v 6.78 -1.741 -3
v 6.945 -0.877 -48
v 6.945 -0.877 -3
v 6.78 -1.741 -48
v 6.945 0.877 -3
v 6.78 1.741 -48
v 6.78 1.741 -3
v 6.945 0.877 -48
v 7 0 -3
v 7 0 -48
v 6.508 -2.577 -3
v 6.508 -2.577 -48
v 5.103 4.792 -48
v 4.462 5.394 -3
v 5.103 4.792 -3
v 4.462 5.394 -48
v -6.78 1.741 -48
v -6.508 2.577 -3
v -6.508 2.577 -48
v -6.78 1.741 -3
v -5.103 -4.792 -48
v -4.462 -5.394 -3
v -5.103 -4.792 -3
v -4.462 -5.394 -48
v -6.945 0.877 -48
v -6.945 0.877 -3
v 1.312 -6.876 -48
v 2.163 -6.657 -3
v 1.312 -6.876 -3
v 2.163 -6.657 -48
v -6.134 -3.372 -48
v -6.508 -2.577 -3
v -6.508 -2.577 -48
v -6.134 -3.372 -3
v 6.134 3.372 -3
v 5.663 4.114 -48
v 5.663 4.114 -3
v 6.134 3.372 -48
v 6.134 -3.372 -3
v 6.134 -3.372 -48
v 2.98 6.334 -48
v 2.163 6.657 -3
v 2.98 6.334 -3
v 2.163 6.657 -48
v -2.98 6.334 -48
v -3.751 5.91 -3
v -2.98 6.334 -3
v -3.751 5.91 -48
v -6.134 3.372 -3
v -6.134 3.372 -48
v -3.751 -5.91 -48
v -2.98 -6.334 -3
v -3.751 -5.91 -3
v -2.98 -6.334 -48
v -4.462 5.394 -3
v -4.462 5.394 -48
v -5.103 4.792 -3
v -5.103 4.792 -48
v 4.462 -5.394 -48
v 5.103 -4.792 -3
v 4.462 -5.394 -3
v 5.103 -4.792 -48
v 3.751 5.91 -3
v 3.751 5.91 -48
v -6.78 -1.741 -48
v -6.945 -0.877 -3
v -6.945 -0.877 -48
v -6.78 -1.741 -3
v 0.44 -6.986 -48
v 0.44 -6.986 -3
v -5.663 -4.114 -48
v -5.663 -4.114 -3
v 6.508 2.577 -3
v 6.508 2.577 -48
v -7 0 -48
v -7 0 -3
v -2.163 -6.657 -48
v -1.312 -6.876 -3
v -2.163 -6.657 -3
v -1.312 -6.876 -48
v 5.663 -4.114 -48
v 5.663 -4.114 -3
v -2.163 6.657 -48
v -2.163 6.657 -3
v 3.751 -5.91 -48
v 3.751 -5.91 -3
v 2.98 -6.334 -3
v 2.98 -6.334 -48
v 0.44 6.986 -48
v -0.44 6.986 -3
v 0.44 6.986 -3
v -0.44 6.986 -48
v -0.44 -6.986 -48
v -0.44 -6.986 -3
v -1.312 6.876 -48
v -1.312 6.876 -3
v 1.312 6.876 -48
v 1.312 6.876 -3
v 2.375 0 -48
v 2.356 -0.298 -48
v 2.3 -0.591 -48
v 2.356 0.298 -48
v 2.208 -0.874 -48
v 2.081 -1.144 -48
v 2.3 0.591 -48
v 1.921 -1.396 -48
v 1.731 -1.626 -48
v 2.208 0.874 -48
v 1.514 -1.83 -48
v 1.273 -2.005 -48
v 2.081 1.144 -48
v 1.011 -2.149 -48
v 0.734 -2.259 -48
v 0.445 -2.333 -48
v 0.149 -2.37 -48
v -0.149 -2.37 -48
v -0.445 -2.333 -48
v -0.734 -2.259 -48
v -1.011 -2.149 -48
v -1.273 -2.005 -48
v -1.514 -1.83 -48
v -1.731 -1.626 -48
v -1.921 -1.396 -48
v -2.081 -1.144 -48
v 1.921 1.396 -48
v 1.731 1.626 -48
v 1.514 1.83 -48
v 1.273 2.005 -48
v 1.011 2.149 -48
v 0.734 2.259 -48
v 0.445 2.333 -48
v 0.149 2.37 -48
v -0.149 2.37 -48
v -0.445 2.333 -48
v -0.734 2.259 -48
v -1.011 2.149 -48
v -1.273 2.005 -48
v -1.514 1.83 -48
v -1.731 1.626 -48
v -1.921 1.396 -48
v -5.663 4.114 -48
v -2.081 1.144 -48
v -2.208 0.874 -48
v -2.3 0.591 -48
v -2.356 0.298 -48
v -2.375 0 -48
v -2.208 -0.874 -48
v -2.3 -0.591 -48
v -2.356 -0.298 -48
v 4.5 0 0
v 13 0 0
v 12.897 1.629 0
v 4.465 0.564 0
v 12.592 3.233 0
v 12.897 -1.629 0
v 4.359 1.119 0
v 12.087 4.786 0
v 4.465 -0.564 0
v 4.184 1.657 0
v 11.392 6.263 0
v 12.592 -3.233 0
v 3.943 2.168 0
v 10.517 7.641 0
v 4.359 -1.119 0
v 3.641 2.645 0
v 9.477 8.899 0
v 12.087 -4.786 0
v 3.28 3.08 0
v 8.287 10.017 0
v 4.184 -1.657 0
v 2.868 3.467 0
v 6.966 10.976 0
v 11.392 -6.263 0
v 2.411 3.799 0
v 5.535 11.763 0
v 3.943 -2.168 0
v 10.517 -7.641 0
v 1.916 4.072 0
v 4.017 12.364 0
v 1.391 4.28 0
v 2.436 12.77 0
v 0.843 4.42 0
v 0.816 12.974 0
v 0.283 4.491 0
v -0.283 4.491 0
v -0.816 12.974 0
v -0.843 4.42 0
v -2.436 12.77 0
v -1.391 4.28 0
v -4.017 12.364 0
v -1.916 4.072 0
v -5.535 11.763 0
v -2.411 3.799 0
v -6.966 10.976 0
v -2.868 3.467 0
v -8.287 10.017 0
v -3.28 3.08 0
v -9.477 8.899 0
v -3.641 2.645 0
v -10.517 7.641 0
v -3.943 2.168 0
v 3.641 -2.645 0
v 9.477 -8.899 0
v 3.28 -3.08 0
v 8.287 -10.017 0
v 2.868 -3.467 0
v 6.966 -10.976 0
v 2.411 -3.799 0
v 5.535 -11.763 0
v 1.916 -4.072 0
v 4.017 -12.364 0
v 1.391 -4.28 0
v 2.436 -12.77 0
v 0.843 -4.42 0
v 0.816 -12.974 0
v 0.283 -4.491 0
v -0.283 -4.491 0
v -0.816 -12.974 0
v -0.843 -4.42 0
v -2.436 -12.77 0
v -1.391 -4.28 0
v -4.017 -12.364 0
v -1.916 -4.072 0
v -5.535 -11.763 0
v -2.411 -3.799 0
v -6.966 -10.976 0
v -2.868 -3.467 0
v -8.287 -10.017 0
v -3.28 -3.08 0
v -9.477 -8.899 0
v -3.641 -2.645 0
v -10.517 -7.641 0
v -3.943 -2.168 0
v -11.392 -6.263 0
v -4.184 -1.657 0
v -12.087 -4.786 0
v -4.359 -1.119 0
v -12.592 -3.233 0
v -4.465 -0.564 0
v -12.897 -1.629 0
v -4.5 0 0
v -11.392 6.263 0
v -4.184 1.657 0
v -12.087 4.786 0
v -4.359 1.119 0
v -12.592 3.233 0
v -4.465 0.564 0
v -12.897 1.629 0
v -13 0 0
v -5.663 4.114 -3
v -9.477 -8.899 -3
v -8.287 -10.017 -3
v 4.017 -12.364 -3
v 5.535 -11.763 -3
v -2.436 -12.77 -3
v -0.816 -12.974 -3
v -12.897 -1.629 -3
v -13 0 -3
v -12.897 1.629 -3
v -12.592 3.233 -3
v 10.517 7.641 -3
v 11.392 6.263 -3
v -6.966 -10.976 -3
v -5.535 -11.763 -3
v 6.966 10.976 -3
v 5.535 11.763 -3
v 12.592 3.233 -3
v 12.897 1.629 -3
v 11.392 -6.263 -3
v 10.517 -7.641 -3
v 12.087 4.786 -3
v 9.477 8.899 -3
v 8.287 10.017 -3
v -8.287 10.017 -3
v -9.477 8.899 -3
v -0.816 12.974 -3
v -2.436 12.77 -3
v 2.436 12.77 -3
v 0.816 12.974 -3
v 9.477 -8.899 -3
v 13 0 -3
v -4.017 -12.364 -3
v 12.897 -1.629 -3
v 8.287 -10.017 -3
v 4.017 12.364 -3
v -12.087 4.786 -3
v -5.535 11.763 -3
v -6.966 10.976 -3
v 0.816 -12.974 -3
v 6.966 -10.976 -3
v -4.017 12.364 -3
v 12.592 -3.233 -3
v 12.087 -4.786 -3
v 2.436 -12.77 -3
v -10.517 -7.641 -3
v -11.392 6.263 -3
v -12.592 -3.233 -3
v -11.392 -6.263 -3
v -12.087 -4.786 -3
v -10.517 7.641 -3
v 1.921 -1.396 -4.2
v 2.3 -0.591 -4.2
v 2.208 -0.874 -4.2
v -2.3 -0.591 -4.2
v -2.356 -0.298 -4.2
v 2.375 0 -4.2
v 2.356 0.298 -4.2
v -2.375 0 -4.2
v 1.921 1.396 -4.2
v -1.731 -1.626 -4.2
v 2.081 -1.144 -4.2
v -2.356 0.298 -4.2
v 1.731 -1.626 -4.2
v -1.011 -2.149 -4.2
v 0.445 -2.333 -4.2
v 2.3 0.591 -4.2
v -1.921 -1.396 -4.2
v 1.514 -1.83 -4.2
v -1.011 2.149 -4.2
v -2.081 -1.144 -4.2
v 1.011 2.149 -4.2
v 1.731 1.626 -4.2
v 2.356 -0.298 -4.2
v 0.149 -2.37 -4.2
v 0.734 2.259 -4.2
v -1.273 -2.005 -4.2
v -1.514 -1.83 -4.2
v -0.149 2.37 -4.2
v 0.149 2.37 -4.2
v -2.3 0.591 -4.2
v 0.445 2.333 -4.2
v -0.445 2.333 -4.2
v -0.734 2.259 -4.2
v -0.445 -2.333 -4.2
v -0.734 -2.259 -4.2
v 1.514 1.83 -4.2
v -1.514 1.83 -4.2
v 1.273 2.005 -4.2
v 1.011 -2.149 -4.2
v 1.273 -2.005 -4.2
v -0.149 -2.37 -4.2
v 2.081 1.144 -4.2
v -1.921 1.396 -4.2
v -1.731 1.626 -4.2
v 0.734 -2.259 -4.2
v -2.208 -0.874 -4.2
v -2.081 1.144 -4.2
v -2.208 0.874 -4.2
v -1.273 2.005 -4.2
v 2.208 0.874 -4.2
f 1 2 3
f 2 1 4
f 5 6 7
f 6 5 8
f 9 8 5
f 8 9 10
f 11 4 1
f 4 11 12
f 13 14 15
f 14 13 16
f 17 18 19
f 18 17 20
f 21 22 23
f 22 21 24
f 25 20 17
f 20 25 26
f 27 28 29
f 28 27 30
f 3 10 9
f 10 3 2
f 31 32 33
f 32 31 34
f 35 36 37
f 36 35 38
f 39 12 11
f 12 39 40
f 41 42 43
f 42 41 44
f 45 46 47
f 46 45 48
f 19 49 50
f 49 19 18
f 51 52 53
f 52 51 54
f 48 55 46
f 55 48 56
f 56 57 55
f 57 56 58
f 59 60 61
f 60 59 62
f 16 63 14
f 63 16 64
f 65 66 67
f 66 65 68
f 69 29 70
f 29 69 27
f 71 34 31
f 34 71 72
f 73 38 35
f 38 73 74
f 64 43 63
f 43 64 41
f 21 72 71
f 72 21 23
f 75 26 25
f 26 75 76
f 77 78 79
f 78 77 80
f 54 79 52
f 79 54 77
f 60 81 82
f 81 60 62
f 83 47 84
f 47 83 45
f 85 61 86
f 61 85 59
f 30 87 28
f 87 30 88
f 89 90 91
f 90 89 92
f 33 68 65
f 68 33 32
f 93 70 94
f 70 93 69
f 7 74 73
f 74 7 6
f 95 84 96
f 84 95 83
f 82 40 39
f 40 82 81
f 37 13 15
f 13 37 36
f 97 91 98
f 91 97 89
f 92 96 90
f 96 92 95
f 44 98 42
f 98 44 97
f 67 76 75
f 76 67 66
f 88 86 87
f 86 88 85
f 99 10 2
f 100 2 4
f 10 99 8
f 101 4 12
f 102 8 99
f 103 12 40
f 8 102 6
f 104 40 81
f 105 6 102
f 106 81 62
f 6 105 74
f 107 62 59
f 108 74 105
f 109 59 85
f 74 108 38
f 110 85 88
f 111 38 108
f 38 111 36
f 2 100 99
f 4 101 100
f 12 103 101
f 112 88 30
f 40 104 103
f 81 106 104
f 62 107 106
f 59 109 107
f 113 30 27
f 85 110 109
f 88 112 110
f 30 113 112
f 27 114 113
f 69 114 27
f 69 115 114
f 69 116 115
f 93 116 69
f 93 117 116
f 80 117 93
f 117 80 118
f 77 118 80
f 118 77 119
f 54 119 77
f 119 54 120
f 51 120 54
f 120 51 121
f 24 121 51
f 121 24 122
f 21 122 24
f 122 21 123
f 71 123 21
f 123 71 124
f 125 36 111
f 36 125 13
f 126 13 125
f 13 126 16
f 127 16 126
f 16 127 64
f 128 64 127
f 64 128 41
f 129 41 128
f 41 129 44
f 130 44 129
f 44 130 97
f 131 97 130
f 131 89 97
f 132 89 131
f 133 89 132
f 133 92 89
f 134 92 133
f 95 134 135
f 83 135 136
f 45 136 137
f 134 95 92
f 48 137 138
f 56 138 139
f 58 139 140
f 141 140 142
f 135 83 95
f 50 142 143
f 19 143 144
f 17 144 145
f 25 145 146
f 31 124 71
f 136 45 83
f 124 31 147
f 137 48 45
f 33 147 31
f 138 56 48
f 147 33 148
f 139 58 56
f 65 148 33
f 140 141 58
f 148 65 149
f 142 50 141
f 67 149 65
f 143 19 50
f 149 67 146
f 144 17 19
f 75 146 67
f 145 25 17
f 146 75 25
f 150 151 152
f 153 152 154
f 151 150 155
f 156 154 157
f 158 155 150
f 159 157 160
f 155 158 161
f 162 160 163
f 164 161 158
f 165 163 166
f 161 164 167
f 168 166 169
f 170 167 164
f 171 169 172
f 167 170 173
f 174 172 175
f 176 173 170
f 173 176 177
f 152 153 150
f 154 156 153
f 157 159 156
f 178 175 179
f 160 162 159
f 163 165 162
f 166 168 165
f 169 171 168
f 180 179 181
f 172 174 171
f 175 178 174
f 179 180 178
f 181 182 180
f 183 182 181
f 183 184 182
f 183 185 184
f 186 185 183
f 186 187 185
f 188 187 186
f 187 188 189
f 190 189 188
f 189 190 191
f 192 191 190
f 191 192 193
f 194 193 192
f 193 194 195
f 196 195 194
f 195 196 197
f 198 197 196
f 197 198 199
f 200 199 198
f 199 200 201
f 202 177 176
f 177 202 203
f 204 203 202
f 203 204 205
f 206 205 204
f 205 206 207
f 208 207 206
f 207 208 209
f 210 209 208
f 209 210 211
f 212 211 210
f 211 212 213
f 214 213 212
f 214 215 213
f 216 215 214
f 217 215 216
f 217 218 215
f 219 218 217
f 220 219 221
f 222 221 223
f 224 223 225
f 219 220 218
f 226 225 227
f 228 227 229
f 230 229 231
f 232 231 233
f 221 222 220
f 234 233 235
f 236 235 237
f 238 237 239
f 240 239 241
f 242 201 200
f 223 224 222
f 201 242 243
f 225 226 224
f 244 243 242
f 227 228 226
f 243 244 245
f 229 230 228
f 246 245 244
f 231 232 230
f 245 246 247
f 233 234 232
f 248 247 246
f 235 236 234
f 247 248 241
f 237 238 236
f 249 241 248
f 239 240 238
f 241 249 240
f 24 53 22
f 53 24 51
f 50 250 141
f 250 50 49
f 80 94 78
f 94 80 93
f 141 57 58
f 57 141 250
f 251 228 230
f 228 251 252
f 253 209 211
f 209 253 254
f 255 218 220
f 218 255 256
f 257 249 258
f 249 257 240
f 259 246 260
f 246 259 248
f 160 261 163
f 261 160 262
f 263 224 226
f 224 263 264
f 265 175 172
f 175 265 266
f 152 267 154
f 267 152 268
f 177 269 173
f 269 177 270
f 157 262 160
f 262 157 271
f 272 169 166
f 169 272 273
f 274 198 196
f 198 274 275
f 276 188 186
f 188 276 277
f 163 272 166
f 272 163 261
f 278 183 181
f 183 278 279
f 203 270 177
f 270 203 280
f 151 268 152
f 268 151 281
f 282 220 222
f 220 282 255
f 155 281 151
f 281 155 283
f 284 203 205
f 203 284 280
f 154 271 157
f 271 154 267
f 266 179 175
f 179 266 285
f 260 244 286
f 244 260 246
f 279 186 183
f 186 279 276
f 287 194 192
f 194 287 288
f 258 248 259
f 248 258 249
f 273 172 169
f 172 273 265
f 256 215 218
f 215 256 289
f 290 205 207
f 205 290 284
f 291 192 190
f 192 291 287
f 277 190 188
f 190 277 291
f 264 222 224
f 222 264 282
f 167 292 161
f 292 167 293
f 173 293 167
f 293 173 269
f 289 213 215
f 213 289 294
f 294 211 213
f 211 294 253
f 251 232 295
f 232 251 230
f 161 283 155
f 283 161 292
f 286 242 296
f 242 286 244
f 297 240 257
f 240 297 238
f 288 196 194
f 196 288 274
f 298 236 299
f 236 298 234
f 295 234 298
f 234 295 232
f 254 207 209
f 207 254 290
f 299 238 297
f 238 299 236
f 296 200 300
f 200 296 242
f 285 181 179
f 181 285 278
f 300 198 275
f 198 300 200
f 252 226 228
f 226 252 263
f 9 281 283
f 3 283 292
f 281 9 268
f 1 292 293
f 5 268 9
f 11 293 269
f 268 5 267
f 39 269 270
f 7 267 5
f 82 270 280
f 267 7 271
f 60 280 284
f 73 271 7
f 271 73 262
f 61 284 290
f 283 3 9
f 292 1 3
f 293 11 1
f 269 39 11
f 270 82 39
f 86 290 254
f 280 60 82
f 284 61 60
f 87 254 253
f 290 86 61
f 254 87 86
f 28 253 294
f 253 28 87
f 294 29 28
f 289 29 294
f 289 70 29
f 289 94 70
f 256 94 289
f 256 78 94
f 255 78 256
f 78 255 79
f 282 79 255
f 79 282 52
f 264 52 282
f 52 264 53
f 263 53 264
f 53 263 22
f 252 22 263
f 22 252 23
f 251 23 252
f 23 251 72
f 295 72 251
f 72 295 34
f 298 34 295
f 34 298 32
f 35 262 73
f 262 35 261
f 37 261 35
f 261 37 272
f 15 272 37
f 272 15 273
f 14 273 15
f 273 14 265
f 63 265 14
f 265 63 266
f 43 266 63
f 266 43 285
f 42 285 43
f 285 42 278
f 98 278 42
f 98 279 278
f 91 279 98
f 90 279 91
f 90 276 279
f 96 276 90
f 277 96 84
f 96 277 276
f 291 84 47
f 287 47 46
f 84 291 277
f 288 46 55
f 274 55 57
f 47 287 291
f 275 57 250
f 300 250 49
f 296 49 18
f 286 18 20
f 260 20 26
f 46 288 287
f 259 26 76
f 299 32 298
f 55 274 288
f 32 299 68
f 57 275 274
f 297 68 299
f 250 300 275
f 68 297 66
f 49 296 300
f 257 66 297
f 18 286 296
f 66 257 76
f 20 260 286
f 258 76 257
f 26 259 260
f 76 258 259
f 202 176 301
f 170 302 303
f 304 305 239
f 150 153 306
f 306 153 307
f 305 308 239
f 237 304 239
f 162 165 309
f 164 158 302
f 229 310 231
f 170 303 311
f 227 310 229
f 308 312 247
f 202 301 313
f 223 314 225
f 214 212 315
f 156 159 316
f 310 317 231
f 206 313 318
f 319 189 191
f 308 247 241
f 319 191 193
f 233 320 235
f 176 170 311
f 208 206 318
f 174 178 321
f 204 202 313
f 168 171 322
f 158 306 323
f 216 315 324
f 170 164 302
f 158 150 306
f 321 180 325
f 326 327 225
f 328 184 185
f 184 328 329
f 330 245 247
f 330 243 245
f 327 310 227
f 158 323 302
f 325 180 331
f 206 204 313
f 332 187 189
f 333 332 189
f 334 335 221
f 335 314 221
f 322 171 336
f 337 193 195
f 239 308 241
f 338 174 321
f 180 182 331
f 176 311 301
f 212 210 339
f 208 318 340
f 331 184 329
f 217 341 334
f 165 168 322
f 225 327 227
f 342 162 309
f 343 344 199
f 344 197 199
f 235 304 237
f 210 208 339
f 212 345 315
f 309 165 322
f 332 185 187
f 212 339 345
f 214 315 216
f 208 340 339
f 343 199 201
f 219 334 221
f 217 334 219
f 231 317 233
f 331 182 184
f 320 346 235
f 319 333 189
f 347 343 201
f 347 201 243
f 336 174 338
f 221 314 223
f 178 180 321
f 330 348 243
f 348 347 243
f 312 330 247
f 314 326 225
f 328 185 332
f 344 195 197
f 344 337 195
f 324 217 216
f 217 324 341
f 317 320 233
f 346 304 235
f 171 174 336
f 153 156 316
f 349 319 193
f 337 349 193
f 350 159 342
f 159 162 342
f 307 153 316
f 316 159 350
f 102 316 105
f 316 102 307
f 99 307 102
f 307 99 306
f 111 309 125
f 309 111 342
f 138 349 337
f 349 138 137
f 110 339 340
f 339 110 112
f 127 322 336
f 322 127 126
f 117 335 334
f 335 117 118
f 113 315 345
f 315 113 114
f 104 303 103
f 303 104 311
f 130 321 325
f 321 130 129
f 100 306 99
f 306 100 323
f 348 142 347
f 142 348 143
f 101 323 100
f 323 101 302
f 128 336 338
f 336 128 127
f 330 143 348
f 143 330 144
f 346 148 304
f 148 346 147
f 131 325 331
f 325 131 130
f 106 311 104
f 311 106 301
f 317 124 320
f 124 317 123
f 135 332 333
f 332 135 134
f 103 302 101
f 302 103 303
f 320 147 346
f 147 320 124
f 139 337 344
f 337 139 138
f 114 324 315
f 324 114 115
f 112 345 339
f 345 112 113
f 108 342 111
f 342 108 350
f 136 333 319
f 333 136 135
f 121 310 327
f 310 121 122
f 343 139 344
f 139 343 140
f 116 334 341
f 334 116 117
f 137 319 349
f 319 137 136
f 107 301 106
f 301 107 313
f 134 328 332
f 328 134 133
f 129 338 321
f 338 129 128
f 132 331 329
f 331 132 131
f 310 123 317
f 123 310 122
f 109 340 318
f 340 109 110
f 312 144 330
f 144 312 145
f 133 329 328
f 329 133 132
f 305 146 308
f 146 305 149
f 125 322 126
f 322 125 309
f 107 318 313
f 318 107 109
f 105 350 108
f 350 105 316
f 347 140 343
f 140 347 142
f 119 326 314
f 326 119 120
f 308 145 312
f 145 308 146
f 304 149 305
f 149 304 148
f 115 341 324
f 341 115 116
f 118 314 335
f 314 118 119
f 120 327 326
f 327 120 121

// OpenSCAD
$fn = 50;


difference() {
	union() {
		translate(v = [0, 0, -48.0000000000]) {
			cylinder(h = 48, r = 7.0000000000);
		}
		translate(v = [0, 0, -3.0000000000]) {
			cylinder(h = 3, r = 13.0000000000);
		}
	}
	union() {
		translate(v = [0, 0, 0]) {
			rotate(a = [0, 0, 0]) {
				difference() {
					union() {
						#translate(v = [0, 0, -48.0000000000]) {
							cylinder(h = 48, r = 2.2500000000);
						}
						#translate(v = [0, 0, -4.2000000000]) {
							cylinder(h = 4.2000000000, r = 7.0000000000, r1 = 2.3750000000, r2 = 4.5000000000);
						}
						#translate(v = [0, 0, -48.0000000000]) {
							cylinder(h = 48, r = 2.3750000000);
						}
						#translate(v = [0, 0, -48.0000000000]) {
							cylinder(h = 48, r = 2.2500000000);
						}
					}
					union();
				}
			}
		}
	}
}
